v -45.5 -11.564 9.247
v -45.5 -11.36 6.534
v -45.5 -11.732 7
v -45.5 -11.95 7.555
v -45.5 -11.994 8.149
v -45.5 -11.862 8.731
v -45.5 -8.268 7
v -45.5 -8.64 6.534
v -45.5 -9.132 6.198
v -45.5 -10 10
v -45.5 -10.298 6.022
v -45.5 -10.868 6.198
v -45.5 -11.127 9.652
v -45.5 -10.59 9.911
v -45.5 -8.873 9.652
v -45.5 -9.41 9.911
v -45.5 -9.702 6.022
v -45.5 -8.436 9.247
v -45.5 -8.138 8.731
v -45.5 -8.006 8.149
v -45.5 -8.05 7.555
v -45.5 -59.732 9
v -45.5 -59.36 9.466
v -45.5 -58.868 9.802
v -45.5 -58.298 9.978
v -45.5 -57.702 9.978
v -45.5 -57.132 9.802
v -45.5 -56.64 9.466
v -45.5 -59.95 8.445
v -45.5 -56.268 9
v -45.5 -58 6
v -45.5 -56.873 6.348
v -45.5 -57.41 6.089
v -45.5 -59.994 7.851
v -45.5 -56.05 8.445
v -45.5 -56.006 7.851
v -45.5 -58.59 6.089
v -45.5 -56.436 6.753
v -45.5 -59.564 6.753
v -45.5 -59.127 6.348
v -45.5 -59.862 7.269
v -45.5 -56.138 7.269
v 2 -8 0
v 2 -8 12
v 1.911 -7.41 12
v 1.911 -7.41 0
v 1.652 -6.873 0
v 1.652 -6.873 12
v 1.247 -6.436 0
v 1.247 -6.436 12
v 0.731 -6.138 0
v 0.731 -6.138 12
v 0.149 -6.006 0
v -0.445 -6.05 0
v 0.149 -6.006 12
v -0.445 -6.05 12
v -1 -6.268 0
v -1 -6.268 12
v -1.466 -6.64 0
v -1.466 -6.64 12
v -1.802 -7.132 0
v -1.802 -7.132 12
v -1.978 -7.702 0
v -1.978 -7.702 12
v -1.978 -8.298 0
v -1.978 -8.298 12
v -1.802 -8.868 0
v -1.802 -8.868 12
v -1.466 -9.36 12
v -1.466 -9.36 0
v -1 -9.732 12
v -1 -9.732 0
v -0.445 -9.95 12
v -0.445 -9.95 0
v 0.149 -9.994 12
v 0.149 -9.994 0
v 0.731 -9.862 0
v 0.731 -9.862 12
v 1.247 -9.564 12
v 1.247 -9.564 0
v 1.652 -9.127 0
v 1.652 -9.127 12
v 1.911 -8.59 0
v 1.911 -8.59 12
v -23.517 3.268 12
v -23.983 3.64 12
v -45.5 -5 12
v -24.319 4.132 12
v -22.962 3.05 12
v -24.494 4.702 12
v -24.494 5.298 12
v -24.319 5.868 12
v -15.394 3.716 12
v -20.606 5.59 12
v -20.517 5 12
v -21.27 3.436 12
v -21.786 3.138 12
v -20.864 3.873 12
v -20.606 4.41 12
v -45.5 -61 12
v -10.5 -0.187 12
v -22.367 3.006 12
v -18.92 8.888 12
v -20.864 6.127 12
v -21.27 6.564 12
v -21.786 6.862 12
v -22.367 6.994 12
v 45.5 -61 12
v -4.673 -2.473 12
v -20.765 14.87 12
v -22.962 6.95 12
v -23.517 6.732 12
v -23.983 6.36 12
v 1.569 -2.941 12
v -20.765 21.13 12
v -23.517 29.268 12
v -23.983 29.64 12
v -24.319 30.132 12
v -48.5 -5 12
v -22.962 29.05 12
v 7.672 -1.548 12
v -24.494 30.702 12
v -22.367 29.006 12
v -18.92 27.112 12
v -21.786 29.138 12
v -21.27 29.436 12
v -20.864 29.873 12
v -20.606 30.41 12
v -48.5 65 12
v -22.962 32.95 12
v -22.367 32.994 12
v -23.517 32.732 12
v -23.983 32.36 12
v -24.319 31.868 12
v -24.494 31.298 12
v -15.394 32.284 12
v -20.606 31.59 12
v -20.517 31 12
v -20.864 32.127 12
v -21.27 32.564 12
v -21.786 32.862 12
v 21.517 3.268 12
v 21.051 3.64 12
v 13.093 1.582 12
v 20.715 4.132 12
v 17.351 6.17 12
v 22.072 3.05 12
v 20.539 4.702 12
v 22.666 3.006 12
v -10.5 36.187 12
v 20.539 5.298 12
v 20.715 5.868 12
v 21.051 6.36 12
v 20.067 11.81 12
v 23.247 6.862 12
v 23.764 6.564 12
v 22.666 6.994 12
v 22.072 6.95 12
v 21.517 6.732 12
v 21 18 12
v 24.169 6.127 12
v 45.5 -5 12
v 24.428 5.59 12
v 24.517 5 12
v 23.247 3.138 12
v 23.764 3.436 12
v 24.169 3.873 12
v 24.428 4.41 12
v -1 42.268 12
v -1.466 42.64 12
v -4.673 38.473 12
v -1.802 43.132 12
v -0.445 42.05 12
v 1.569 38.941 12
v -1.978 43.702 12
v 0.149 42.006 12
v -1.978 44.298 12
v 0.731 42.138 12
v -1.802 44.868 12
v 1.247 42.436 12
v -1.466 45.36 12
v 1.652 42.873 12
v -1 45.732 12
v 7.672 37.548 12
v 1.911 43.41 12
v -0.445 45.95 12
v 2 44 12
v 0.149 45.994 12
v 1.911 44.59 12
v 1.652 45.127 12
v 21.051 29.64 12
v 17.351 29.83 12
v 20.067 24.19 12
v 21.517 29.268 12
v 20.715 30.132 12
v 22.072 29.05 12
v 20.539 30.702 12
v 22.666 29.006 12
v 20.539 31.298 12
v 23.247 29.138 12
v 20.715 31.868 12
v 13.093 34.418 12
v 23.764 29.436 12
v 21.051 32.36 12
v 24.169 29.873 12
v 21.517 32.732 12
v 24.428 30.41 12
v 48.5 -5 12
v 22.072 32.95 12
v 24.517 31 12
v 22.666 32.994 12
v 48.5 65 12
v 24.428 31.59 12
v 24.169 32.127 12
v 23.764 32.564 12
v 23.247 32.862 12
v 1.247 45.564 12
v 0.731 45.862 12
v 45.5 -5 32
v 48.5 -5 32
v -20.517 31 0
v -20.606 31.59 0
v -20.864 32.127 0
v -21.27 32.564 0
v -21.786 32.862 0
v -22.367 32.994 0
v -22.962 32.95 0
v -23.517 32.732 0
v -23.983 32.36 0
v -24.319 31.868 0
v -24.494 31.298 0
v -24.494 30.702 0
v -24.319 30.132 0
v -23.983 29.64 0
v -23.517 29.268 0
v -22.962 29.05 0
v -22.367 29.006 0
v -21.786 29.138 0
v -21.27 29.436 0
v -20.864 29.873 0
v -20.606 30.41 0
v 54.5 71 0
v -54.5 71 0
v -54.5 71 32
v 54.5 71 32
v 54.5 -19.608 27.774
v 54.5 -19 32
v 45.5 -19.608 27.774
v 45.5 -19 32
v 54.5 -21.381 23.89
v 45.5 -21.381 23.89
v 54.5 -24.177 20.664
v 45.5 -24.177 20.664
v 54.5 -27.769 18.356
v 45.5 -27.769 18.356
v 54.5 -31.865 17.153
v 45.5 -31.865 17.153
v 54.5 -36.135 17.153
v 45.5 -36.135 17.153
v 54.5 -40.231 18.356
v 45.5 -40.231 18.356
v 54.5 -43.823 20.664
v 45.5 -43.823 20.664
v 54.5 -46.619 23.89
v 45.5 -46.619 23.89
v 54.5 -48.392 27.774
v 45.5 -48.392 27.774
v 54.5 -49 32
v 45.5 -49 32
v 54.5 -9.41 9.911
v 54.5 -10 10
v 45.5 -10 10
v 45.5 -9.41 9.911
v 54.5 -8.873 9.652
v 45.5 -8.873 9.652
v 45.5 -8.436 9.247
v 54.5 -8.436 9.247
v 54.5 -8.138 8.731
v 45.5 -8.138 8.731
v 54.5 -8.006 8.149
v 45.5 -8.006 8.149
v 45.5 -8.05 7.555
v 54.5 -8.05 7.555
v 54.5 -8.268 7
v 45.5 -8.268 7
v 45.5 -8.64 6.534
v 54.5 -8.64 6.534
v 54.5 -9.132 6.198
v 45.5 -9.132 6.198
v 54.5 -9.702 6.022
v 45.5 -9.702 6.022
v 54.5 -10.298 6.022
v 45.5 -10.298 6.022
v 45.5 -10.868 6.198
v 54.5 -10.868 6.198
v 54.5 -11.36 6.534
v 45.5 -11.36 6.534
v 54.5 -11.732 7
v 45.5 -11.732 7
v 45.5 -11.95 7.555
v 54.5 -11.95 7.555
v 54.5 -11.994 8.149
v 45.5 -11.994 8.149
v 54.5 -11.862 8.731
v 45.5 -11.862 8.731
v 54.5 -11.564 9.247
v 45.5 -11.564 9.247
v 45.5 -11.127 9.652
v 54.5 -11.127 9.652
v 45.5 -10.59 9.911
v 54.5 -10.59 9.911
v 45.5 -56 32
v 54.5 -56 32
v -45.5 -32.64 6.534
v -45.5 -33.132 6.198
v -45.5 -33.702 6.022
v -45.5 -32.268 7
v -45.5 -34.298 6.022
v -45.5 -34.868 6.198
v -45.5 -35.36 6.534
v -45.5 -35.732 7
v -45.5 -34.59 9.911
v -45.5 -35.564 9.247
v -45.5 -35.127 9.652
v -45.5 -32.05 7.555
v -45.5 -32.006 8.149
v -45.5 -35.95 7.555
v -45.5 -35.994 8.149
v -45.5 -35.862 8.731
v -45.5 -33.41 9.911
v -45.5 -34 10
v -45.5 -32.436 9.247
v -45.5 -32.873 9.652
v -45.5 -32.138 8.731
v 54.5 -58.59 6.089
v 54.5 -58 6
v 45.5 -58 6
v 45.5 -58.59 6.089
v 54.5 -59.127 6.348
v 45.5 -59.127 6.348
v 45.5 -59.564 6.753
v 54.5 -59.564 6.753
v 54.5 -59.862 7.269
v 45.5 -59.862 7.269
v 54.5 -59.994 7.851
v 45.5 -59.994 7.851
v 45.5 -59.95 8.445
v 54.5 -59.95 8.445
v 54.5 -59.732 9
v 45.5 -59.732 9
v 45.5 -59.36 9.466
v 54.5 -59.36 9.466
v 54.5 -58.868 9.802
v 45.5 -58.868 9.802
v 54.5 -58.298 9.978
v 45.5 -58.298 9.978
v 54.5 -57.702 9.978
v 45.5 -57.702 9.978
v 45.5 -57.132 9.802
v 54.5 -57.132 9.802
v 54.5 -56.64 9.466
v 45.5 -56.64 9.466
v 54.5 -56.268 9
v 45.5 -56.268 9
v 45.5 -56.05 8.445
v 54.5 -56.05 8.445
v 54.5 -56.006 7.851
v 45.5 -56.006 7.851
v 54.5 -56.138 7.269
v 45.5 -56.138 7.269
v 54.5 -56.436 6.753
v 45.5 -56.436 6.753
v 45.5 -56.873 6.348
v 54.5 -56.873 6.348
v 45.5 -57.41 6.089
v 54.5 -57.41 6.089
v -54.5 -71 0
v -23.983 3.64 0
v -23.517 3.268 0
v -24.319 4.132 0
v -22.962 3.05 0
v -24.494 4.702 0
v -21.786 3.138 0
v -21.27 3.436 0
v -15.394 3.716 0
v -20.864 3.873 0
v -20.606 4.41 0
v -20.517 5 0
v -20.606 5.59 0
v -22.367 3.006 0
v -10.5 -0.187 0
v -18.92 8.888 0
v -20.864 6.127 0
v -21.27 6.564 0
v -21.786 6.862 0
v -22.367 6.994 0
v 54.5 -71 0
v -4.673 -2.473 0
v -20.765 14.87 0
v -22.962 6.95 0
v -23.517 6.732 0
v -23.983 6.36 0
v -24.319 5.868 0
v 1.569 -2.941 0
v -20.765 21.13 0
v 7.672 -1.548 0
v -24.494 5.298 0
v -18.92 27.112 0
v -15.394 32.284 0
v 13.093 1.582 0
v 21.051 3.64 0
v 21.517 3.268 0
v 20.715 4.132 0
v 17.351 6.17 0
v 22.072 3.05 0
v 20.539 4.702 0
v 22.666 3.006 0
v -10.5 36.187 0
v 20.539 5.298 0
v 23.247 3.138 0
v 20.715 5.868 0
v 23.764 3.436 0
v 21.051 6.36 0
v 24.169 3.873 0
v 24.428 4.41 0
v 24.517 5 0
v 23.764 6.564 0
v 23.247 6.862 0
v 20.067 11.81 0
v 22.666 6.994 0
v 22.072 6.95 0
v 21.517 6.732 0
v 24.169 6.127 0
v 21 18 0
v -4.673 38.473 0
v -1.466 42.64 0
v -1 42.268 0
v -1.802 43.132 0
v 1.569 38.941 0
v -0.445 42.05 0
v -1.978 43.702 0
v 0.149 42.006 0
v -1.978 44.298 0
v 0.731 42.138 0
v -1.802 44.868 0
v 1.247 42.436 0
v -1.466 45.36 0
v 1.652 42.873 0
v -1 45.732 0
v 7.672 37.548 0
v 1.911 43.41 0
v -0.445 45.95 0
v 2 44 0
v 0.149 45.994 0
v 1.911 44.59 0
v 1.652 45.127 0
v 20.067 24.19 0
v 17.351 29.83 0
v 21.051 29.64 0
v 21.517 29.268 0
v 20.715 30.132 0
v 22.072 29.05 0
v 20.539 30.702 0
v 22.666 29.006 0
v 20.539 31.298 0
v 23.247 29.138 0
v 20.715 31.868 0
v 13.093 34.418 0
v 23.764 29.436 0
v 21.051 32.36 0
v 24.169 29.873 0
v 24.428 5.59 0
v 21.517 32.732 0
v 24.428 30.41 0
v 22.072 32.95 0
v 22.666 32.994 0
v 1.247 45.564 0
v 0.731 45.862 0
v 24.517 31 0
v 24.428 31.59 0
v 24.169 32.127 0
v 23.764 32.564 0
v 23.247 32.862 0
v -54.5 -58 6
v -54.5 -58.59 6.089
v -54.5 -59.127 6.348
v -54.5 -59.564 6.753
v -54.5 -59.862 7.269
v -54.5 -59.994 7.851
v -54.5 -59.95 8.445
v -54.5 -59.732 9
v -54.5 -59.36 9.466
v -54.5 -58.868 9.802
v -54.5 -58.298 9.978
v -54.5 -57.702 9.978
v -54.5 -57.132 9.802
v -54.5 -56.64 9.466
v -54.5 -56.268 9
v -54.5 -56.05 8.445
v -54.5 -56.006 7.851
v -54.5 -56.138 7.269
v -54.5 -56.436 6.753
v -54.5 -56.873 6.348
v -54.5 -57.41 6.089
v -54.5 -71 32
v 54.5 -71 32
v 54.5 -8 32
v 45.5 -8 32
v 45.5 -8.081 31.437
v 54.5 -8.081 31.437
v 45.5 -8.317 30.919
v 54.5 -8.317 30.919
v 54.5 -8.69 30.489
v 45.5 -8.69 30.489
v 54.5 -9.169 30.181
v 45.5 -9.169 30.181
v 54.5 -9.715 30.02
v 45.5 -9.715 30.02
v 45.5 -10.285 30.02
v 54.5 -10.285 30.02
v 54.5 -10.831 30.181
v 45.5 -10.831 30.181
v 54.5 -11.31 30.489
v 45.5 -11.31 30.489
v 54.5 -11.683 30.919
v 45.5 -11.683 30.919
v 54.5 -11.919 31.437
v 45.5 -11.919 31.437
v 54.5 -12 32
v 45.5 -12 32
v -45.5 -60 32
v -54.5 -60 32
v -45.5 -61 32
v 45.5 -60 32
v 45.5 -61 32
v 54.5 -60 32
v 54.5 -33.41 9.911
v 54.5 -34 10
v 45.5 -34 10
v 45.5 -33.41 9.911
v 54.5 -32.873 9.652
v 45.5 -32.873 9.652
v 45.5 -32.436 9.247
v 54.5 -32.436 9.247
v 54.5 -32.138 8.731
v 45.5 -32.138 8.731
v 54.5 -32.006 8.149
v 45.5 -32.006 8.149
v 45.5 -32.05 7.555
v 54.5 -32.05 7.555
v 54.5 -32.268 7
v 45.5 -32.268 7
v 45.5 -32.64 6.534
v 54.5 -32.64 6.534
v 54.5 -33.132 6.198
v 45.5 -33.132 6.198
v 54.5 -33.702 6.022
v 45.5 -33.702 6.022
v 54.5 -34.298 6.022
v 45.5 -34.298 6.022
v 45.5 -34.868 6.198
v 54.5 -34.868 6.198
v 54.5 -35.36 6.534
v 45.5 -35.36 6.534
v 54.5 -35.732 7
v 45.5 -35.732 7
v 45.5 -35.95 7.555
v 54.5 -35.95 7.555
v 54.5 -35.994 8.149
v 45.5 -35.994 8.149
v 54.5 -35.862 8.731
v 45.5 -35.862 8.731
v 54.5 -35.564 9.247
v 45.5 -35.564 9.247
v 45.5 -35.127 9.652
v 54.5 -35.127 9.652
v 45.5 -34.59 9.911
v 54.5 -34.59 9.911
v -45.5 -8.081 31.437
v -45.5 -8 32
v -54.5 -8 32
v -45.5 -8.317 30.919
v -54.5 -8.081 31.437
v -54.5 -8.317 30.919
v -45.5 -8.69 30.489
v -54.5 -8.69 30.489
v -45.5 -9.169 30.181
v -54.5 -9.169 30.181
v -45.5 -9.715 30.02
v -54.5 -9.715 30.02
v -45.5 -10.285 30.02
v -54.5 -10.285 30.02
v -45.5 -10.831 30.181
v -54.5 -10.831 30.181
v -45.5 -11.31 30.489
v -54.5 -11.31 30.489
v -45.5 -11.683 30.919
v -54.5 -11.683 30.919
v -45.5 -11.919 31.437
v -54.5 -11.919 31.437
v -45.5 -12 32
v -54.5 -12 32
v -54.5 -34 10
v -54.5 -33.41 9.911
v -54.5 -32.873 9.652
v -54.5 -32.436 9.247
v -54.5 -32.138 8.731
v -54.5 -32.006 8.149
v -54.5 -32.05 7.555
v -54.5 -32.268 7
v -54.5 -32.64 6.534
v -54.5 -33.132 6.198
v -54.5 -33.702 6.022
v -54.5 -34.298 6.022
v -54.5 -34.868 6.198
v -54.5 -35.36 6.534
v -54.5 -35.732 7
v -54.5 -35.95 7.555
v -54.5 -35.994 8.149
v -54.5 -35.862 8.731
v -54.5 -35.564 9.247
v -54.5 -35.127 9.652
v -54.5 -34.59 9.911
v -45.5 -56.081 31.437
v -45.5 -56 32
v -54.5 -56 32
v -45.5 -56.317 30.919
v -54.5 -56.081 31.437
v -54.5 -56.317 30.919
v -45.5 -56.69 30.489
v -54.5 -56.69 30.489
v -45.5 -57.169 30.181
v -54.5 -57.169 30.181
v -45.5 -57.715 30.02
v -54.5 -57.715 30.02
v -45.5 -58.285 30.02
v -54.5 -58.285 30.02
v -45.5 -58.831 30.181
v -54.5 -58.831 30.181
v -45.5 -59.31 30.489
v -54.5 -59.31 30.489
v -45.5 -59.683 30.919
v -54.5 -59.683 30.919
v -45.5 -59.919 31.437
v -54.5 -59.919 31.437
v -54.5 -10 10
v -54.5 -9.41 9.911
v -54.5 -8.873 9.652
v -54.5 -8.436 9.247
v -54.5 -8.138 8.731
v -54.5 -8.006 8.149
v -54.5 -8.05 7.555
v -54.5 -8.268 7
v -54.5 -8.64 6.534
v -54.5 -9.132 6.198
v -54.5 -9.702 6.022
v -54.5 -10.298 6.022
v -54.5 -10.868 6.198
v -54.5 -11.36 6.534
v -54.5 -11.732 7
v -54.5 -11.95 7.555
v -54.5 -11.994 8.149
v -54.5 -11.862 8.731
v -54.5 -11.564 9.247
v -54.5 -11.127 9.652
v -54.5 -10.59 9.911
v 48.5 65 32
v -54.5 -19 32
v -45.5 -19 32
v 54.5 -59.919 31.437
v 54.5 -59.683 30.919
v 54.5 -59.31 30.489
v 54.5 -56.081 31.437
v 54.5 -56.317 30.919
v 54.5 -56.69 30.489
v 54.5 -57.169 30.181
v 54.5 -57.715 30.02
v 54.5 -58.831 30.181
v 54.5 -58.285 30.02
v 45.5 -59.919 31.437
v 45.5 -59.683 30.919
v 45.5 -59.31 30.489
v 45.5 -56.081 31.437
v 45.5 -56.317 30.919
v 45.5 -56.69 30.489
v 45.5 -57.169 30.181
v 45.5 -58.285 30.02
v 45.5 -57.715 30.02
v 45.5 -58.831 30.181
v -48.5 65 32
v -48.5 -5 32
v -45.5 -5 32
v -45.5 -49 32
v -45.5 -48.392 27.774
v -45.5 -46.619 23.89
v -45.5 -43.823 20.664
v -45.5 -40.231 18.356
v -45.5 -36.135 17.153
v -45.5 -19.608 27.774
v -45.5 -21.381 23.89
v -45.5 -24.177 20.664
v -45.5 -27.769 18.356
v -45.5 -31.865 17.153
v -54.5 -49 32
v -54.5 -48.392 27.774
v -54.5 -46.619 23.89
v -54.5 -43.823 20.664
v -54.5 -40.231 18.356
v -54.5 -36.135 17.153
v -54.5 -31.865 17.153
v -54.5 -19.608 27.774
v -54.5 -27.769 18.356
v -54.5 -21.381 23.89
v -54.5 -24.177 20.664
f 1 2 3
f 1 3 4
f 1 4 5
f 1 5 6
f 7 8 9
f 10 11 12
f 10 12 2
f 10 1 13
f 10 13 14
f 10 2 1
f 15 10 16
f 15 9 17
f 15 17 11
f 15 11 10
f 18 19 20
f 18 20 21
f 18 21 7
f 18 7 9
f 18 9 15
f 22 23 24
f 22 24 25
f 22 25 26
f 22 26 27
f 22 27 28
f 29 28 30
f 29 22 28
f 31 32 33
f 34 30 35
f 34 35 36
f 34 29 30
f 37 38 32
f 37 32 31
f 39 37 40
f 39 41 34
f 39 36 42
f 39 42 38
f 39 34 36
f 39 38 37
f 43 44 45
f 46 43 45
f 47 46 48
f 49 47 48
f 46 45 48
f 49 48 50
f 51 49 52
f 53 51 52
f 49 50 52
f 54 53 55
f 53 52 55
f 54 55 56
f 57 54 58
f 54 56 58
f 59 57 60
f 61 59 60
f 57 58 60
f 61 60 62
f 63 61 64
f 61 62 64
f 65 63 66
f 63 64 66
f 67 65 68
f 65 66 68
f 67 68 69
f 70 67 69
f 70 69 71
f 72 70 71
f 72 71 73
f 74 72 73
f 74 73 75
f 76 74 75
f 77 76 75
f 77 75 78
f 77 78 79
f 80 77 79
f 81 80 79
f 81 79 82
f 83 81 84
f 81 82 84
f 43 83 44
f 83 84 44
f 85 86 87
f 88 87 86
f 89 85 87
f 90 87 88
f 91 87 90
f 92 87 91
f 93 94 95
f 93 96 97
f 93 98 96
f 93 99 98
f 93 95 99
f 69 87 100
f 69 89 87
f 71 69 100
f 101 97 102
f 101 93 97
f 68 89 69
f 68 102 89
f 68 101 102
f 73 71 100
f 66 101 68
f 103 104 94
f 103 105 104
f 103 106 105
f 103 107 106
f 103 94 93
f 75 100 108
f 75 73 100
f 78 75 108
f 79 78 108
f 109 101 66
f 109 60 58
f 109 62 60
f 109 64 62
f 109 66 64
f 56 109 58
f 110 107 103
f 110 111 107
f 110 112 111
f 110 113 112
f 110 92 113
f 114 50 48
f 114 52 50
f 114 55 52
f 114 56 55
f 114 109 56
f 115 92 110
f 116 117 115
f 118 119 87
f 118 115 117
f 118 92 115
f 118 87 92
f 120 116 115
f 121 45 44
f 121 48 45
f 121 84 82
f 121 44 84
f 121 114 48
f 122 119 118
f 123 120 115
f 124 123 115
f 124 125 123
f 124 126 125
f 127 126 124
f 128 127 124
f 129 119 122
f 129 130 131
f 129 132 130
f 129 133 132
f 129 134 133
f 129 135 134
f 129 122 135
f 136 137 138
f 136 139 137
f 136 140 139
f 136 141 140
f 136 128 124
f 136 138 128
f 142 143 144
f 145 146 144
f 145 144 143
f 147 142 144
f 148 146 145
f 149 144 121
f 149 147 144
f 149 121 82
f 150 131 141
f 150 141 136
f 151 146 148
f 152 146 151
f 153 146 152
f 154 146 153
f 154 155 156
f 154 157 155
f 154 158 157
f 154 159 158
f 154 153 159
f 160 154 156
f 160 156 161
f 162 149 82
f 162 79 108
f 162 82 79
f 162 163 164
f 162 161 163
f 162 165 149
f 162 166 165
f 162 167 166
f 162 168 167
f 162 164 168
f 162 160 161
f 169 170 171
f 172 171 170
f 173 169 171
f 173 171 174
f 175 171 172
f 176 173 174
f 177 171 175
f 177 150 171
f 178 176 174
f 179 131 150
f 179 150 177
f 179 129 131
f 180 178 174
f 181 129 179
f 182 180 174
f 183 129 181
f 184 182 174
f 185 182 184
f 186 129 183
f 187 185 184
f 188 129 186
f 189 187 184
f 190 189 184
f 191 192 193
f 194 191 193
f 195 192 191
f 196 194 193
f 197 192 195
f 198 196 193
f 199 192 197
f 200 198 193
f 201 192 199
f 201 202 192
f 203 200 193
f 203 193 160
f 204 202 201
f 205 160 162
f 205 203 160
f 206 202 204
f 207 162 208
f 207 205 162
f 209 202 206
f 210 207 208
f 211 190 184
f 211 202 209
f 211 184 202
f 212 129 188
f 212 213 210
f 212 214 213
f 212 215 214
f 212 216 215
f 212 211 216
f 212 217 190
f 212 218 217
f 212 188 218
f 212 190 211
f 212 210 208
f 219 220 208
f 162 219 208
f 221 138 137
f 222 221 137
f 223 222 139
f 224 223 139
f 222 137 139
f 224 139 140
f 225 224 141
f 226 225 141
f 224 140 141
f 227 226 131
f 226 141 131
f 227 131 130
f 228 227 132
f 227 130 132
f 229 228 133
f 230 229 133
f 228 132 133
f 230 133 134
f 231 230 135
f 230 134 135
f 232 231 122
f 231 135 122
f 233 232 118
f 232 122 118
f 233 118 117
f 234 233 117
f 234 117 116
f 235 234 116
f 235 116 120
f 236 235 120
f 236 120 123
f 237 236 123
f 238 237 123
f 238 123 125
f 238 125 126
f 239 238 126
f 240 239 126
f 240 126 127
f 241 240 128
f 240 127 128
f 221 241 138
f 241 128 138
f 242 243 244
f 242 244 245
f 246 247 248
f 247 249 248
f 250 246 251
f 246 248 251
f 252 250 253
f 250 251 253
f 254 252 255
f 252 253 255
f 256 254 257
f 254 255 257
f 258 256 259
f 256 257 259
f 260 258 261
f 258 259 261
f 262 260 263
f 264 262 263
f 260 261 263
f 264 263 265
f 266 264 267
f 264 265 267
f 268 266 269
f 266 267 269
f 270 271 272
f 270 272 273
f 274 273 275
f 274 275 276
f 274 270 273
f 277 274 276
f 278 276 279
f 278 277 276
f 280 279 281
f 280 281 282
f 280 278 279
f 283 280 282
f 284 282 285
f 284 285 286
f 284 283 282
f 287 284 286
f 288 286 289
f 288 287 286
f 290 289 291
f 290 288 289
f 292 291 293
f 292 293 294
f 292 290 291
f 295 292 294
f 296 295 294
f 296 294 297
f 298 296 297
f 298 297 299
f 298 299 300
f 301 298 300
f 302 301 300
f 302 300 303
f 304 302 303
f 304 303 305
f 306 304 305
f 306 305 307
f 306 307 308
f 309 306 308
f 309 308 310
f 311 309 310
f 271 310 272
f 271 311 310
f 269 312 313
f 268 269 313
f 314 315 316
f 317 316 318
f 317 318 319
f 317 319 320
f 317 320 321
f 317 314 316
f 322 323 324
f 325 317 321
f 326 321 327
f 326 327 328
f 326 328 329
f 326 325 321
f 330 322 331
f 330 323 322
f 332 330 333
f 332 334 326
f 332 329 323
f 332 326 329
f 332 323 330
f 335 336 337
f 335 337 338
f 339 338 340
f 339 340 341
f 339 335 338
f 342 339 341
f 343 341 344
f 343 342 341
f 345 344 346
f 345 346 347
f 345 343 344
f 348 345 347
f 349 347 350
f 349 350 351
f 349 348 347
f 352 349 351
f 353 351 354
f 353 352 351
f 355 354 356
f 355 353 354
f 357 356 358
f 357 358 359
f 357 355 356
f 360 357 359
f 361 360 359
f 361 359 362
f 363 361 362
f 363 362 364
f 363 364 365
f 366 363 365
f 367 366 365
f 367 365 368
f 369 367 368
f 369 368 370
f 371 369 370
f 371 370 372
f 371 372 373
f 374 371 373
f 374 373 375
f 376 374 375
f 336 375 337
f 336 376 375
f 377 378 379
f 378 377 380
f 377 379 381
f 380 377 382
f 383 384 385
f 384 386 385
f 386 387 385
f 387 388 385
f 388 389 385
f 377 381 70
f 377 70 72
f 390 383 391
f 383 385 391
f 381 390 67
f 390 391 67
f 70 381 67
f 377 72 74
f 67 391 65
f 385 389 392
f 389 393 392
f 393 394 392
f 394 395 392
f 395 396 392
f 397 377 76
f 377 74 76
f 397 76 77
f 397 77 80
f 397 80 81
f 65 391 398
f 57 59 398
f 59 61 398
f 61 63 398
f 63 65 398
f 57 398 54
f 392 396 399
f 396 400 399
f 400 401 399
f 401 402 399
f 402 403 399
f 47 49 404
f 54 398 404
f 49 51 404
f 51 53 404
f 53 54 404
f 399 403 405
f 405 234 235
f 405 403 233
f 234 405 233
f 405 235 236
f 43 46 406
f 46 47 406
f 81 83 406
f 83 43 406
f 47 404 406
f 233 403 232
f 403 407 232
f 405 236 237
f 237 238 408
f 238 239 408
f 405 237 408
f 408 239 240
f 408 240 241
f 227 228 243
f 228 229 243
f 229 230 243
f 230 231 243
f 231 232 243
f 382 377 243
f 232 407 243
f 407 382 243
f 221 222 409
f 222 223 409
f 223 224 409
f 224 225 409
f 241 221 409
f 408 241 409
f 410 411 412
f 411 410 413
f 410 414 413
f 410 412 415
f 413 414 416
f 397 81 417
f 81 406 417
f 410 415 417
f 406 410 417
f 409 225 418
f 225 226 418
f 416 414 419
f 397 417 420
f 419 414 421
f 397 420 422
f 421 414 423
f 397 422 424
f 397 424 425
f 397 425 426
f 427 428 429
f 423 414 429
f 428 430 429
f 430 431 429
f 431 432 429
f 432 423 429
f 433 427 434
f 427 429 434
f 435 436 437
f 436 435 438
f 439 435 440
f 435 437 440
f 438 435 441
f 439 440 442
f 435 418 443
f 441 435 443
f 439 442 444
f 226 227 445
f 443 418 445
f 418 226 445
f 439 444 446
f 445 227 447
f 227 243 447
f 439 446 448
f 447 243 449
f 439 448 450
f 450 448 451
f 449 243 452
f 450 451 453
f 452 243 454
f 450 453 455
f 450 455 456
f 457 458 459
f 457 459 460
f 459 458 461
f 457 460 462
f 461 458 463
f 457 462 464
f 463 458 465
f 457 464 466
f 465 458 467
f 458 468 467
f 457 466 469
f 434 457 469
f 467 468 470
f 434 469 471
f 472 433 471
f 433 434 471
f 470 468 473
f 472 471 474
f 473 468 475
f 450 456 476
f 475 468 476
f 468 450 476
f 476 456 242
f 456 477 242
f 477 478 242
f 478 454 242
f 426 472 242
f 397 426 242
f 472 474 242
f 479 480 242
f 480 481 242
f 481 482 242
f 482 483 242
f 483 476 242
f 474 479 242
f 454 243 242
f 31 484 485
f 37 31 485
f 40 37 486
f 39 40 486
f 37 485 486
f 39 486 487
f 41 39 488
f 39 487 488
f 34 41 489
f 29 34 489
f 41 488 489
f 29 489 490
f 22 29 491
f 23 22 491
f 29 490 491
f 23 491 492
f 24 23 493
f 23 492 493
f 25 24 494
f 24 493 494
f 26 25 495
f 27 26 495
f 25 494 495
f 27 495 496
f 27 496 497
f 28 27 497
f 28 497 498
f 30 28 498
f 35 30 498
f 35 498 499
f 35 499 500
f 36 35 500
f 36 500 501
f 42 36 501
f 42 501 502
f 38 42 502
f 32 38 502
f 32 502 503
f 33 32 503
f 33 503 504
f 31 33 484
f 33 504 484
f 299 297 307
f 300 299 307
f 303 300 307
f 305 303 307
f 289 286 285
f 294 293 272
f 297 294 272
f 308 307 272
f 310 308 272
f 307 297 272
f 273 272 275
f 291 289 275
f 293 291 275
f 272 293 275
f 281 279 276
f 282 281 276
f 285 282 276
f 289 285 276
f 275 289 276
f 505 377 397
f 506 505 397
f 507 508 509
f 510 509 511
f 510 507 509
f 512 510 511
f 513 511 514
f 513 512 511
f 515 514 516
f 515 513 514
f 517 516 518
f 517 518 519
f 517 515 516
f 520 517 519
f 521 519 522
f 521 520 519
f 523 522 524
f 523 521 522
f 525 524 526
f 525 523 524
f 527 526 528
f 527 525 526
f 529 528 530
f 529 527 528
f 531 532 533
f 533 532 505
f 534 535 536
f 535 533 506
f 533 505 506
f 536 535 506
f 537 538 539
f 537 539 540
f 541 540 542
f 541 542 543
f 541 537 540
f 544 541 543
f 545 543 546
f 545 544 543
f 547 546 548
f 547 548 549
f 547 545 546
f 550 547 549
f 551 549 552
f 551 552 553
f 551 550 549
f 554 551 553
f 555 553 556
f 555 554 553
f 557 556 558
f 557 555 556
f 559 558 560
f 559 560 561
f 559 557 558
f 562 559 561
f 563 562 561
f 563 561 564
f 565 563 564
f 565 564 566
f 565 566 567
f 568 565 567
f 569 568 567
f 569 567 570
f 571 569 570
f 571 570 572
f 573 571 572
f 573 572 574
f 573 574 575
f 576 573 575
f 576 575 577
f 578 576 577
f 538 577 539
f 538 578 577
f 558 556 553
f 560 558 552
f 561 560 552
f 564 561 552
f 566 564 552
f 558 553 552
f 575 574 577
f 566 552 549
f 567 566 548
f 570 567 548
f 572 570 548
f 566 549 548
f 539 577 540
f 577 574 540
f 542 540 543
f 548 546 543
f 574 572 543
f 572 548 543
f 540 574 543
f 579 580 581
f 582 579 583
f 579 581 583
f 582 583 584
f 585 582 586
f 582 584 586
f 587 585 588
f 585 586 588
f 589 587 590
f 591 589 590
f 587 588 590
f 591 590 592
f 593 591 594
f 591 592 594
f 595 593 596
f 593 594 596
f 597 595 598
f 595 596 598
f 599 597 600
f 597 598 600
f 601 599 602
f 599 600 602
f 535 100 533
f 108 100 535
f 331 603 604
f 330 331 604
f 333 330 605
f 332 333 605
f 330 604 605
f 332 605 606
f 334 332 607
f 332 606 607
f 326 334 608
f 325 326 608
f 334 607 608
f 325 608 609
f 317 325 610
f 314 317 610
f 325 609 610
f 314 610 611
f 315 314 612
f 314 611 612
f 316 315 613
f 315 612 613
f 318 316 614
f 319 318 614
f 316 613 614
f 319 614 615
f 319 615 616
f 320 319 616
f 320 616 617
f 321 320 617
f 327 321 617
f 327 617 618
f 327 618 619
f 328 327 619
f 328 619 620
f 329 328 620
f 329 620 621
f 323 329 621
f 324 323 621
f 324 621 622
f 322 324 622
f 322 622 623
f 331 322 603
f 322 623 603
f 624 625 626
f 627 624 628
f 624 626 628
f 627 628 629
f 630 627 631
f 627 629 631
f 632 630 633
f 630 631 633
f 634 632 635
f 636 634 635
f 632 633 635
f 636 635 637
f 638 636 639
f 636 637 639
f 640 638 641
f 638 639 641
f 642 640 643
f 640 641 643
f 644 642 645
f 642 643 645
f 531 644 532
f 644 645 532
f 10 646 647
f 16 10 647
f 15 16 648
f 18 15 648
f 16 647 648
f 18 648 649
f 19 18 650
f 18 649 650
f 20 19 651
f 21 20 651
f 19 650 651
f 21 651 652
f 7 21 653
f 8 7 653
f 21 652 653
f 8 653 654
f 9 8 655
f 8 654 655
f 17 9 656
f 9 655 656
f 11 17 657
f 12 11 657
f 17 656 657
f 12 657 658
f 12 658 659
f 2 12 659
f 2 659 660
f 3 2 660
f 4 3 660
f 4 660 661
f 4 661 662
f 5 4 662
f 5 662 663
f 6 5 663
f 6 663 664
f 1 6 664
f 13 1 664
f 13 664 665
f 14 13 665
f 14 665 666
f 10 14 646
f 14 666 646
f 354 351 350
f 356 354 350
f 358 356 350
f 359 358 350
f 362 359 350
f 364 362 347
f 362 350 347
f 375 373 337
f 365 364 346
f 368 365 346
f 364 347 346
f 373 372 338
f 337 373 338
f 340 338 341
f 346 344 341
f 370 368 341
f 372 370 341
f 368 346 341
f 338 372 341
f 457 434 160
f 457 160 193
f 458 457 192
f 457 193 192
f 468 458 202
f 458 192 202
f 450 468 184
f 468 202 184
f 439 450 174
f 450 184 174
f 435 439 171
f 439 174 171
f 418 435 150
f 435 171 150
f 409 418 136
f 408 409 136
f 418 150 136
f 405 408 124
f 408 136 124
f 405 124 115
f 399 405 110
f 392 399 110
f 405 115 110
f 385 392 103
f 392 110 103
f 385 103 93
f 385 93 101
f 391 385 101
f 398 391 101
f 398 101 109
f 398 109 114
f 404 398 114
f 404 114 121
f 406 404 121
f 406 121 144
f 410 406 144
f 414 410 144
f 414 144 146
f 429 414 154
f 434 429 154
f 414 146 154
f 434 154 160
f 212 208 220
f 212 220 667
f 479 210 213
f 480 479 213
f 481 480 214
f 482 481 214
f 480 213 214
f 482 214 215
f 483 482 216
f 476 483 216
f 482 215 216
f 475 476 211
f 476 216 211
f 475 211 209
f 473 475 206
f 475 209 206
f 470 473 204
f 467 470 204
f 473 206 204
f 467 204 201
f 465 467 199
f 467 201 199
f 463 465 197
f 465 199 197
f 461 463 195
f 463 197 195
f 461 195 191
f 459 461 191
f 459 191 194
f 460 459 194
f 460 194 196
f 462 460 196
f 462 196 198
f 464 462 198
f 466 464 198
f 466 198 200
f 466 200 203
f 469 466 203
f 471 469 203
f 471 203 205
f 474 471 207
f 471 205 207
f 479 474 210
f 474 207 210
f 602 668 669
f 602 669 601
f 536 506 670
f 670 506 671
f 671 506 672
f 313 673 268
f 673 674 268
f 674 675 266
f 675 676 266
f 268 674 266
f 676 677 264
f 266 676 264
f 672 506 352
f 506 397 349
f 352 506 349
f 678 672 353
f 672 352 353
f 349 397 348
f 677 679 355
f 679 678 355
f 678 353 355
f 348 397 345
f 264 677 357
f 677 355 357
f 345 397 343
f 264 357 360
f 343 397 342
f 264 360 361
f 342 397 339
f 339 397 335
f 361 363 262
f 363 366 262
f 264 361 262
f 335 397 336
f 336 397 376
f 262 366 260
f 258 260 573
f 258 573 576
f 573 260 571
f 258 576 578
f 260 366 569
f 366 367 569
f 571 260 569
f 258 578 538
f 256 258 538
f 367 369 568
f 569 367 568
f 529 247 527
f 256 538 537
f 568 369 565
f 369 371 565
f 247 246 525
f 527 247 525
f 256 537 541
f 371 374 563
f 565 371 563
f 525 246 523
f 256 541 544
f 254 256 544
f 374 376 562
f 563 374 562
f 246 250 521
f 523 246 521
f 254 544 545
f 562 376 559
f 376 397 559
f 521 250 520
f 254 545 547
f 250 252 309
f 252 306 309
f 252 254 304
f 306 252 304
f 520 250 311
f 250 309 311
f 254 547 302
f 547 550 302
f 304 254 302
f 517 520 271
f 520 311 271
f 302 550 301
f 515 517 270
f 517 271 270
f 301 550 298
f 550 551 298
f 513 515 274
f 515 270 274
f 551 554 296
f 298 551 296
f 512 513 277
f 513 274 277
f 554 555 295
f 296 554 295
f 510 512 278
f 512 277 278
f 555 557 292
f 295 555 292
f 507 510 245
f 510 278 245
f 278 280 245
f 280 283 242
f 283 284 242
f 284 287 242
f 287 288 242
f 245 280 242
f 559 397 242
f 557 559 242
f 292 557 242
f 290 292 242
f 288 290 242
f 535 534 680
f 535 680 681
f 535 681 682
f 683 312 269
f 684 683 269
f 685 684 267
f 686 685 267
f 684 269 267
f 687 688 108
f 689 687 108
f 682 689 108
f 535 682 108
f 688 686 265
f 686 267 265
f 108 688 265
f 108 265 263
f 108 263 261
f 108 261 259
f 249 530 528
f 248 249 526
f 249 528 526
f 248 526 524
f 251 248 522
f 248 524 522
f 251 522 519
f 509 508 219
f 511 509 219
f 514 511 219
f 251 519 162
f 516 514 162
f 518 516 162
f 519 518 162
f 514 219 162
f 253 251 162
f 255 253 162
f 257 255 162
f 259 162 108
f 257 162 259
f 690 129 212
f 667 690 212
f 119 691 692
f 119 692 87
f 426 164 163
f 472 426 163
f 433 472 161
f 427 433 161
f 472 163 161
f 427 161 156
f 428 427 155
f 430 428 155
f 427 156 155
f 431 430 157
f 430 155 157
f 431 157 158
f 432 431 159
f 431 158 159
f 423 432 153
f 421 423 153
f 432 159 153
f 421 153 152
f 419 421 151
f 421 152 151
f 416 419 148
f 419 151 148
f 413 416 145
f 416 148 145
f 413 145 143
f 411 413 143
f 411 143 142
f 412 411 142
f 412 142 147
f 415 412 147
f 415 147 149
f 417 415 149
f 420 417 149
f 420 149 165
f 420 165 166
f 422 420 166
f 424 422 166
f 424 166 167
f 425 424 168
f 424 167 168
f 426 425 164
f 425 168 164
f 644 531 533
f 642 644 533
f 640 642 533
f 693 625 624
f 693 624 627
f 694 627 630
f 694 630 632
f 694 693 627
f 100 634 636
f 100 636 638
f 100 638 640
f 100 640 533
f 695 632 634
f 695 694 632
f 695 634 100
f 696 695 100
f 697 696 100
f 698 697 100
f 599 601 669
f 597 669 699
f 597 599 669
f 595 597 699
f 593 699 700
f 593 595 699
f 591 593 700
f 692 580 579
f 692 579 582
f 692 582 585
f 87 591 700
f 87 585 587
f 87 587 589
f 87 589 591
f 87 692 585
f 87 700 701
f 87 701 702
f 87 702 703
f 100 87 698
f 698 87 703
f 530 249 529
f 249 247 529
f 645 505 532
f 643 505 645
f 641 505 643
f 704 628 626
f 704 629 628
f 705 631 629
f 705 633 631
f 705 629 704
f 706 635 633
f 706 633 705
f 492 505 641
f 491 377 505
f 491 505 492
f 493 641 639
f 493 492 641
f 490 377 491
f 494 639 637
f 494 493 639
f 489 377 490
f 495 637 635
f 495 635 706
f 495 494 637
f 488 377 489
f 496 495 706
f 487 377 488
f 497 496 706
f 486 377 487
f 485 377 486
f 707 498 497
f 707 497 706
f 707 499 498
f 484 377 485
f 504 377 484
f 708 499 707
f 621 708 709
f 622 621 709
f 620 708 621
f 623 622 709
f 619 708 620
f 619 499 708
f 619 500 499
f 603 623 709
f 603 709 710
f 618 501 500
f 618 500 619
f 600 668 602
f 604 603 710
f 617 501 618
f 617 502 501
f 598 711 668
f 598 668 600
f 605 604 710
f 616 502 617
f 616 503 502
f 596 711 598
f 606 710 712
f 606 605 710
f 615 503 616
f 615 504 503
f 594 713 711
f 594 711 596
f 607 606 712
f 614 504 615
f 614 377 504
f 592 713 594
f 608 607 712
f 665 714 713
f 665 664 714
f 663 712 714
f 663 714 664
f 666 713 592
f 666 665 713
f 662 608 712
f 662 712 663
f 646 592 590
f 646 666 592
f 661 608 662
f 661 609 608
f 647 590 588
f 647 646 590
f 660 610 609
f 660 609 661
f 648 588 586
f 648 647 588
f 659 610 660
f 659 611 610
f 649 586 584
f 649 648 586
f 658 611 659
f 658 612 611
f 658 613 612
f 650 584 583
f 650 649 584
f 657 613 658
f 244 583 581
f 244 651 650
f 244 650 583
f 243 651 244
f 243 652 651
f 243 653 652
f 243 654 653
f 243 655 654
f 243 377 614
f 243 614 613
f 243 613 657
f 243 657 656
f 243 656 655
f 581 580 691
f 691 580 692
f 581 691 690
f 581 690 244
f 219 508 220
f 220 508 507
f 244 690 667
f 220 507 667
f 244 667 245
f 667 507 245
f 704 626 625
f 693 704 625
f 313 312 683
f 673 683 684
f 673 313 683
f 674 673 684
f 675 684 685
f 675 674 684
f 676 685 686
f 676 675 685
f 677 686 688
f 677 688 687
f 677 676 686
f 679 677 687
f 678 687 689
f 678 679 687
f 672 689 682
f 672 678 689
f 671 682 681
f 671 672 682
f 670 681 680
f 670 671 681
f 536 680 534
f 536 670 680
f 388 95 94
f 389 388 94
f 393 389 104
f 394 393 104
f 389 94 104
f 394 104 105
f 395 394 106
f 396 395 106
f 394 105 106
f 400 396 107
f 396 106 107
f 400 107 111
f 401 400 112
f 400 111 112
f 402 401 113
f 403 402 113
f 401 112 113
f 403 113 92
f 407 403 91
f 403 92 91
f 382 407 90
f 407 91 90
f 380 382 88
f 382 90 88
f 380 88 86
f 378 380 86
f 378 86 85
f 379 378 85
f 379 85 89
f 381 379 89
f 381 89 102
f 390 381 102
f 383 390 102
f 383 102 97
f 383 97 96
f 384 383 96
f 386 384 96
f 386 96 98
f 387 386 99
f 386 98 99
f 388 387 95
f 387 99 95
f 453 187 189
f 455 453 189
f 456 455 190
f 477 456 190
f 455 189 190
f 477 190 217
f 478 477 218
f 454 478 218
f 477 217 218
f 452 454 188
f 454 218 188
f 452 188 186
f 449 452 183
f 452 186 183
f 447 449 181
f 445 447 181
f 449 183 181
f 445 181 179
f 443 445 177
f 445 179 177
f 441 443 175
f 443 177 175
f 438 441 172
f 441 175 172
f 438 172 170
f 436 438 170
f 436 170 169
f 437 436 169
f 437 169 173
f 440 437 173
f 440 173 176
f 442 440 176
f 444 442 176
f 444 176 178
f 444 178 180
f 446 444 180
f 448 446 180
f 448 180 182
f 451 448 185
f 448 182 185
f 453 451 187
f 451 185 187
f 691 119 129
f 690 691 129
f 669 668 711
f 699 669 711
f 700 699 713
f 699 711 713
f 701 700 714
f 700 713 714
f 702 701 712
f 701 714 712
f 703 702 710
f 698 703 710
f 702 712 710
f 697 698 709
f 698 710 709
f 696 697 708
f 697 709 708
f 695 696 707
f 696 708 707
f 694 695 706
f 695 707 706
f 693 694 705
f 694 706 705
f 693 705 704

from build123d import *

# Parameters (mm, degrees)
SKETCH1_W           = 97
SKETCH1_H           = 130
BOSS_EXTRUDE1_DEPTH = 12
SKETCH9_R           = 21
SKETCH9_R_2         = 2
CUT_EXTRUDE2_DEPTH  = 12
SKETCH11_W          = 109
SKETCH11_H          = 142
SKETCH11_W_2        = 97
SKETCH11_H_2        = 130
BOSS_EXTRUDE4_DEPTH = 32
SKETCH18_W          = 20
SKETCH18_H          = 60
BOSS_EXTRUDE5_DEPTH = 3
SKETCH14_R          = 15
CUT_EXTRUDE5_DEPTH  = 134.962681371
SKETCH20_W          = 91
SKETCH20_H          = 20
BOSS_EXTRUDE6_DEPTH = 4
SKETCH21_R          = 2
CUT_EXTRUDE6_DEPTH  = 9


with BuildPart() as part:
    # Sketch1 → Boss-Extrude1 (new body)
    with BuildSketch(Plane.XY):
        Rectangle(SKETCH1_W, SKETCH1_H)
    extrude(amount=BOSS_EXTRUDE1_DEPTH)

    # Sketch9 → Cut-Extrude2 (cut)
    with BuildSketch(Plane.XY.offset(12)):
        with Locations((0, 18)):
            Circle(SKETCH9_R)
        with Locations((0, 44)):
            Circle(SKETCH9_R_2)
        with Locations((22.516660498, 31)):
            Circle(SKETCH9_R_2)
        with Locations((22.516660498, 5)):
            Circle(SKETCH9_R_2)
        with Locations((0, -8)):
            Circle(SKETCH9_R_2)
        with Locations((-22.516660498, 5)):
            Circle(SKETCH9_R_2)
        with Locations((-22.516660498, 31)):
            Circle(SKETCH9_R_2)
    extrude(amount=-CUT_EXTRUDE2_DEPTH, mode=Mode.SUBTRACT)

    # Sketch11 → Boss-Extrude4 (add)
    with BuildSketch(Plane.XY):
        Rectangle(SKETCH11_W, SKETCH11_H)
        Rectangle(SKETCH11_W_2, SKETCH11_H_2, mode=Mode.SUBTRACT)
    extrude(amount=BOSS_EXTRUDE4_DEPTH)

    # Sketch18 → Boss-Extrude5 (add)
    with BuildSketch(Plane(origin=(-48.5, 0, 0), x_dir=(0, 0, -1), z_dir=(1, 0, 0))):
        with Locations((-22, -35)):
            Rectangle(SKETCH18_W, SKETCH18_H)
    boss_extrude5 = extrude(amount=BOSS_EXTRUDE5_DEPTH)

    # Mirror1: Boss-Extrude5 across plane
    add(boss_extrude5.mirror(Plane(origin=(0, 0, 0), x_dir=(0, 0, 1), z_dir=(1, 0, 0))))

    # Sketch14 → Cut-Extrude5 (cut, through all)
    with BuildSketch(Plane.ZY.offset(54.5)):
        with Locations((32, -34)):
            Circle(SKETCH14_R)
    extrude(amount=-CUT_EXTRUDE5_DEPTH, mode=Mode.SUBTRACT)

    # Sketch20 → Boss-Extrude6 (add)
    with BuildSketch(Plane(origin=(0, -65, 0), x_dir=(1, 0, 0), z_dir=(0, 1, 0))):
        with Locations((0, -22)):
            Rectangle(SKETCH20_W, SKETCH20_H)
    extrude(amount=BOSS_EXTRUDE6_DEPTH)

    # Sketch21 → Cut-Extrude6 (cut)
    with BuildSketch(Plane.ZY.offset(54.5)):
        with Locations((32, -10)):
            Circle(SKETCH21_R)
        with Locations((8, -10)):
            Circle(SKETCH21_R)
        with Locations((56, -10)):
            Circle(SKETCH21_R)
        with Locations((56, -58)):
            Circle(SKETCH21_R)
        with Locations((32, -58)):
            Circle(SKETCH21_R)
        with Locations(Location((8, -58, 0), (0, 0, 180))):
            Circle(SKETCH21_R)
        with Locations((8, -34)):
            Circle(SKETCH21_R)
    cut_extrude6 = extrude(amount=-CUT_EXTRUDE6_DEPTH, mode=Mode.SUBTRACT)

    # Mirror2: Cut-Extrude6 across plane
    add(cut_extrude6.mirror(Plane(origin=(0, 0, 0), x_dir=(0, 0, 1), z_dir=(1, 0, 0))), mode=Mode.SUBTRACT)


solid = part.part
